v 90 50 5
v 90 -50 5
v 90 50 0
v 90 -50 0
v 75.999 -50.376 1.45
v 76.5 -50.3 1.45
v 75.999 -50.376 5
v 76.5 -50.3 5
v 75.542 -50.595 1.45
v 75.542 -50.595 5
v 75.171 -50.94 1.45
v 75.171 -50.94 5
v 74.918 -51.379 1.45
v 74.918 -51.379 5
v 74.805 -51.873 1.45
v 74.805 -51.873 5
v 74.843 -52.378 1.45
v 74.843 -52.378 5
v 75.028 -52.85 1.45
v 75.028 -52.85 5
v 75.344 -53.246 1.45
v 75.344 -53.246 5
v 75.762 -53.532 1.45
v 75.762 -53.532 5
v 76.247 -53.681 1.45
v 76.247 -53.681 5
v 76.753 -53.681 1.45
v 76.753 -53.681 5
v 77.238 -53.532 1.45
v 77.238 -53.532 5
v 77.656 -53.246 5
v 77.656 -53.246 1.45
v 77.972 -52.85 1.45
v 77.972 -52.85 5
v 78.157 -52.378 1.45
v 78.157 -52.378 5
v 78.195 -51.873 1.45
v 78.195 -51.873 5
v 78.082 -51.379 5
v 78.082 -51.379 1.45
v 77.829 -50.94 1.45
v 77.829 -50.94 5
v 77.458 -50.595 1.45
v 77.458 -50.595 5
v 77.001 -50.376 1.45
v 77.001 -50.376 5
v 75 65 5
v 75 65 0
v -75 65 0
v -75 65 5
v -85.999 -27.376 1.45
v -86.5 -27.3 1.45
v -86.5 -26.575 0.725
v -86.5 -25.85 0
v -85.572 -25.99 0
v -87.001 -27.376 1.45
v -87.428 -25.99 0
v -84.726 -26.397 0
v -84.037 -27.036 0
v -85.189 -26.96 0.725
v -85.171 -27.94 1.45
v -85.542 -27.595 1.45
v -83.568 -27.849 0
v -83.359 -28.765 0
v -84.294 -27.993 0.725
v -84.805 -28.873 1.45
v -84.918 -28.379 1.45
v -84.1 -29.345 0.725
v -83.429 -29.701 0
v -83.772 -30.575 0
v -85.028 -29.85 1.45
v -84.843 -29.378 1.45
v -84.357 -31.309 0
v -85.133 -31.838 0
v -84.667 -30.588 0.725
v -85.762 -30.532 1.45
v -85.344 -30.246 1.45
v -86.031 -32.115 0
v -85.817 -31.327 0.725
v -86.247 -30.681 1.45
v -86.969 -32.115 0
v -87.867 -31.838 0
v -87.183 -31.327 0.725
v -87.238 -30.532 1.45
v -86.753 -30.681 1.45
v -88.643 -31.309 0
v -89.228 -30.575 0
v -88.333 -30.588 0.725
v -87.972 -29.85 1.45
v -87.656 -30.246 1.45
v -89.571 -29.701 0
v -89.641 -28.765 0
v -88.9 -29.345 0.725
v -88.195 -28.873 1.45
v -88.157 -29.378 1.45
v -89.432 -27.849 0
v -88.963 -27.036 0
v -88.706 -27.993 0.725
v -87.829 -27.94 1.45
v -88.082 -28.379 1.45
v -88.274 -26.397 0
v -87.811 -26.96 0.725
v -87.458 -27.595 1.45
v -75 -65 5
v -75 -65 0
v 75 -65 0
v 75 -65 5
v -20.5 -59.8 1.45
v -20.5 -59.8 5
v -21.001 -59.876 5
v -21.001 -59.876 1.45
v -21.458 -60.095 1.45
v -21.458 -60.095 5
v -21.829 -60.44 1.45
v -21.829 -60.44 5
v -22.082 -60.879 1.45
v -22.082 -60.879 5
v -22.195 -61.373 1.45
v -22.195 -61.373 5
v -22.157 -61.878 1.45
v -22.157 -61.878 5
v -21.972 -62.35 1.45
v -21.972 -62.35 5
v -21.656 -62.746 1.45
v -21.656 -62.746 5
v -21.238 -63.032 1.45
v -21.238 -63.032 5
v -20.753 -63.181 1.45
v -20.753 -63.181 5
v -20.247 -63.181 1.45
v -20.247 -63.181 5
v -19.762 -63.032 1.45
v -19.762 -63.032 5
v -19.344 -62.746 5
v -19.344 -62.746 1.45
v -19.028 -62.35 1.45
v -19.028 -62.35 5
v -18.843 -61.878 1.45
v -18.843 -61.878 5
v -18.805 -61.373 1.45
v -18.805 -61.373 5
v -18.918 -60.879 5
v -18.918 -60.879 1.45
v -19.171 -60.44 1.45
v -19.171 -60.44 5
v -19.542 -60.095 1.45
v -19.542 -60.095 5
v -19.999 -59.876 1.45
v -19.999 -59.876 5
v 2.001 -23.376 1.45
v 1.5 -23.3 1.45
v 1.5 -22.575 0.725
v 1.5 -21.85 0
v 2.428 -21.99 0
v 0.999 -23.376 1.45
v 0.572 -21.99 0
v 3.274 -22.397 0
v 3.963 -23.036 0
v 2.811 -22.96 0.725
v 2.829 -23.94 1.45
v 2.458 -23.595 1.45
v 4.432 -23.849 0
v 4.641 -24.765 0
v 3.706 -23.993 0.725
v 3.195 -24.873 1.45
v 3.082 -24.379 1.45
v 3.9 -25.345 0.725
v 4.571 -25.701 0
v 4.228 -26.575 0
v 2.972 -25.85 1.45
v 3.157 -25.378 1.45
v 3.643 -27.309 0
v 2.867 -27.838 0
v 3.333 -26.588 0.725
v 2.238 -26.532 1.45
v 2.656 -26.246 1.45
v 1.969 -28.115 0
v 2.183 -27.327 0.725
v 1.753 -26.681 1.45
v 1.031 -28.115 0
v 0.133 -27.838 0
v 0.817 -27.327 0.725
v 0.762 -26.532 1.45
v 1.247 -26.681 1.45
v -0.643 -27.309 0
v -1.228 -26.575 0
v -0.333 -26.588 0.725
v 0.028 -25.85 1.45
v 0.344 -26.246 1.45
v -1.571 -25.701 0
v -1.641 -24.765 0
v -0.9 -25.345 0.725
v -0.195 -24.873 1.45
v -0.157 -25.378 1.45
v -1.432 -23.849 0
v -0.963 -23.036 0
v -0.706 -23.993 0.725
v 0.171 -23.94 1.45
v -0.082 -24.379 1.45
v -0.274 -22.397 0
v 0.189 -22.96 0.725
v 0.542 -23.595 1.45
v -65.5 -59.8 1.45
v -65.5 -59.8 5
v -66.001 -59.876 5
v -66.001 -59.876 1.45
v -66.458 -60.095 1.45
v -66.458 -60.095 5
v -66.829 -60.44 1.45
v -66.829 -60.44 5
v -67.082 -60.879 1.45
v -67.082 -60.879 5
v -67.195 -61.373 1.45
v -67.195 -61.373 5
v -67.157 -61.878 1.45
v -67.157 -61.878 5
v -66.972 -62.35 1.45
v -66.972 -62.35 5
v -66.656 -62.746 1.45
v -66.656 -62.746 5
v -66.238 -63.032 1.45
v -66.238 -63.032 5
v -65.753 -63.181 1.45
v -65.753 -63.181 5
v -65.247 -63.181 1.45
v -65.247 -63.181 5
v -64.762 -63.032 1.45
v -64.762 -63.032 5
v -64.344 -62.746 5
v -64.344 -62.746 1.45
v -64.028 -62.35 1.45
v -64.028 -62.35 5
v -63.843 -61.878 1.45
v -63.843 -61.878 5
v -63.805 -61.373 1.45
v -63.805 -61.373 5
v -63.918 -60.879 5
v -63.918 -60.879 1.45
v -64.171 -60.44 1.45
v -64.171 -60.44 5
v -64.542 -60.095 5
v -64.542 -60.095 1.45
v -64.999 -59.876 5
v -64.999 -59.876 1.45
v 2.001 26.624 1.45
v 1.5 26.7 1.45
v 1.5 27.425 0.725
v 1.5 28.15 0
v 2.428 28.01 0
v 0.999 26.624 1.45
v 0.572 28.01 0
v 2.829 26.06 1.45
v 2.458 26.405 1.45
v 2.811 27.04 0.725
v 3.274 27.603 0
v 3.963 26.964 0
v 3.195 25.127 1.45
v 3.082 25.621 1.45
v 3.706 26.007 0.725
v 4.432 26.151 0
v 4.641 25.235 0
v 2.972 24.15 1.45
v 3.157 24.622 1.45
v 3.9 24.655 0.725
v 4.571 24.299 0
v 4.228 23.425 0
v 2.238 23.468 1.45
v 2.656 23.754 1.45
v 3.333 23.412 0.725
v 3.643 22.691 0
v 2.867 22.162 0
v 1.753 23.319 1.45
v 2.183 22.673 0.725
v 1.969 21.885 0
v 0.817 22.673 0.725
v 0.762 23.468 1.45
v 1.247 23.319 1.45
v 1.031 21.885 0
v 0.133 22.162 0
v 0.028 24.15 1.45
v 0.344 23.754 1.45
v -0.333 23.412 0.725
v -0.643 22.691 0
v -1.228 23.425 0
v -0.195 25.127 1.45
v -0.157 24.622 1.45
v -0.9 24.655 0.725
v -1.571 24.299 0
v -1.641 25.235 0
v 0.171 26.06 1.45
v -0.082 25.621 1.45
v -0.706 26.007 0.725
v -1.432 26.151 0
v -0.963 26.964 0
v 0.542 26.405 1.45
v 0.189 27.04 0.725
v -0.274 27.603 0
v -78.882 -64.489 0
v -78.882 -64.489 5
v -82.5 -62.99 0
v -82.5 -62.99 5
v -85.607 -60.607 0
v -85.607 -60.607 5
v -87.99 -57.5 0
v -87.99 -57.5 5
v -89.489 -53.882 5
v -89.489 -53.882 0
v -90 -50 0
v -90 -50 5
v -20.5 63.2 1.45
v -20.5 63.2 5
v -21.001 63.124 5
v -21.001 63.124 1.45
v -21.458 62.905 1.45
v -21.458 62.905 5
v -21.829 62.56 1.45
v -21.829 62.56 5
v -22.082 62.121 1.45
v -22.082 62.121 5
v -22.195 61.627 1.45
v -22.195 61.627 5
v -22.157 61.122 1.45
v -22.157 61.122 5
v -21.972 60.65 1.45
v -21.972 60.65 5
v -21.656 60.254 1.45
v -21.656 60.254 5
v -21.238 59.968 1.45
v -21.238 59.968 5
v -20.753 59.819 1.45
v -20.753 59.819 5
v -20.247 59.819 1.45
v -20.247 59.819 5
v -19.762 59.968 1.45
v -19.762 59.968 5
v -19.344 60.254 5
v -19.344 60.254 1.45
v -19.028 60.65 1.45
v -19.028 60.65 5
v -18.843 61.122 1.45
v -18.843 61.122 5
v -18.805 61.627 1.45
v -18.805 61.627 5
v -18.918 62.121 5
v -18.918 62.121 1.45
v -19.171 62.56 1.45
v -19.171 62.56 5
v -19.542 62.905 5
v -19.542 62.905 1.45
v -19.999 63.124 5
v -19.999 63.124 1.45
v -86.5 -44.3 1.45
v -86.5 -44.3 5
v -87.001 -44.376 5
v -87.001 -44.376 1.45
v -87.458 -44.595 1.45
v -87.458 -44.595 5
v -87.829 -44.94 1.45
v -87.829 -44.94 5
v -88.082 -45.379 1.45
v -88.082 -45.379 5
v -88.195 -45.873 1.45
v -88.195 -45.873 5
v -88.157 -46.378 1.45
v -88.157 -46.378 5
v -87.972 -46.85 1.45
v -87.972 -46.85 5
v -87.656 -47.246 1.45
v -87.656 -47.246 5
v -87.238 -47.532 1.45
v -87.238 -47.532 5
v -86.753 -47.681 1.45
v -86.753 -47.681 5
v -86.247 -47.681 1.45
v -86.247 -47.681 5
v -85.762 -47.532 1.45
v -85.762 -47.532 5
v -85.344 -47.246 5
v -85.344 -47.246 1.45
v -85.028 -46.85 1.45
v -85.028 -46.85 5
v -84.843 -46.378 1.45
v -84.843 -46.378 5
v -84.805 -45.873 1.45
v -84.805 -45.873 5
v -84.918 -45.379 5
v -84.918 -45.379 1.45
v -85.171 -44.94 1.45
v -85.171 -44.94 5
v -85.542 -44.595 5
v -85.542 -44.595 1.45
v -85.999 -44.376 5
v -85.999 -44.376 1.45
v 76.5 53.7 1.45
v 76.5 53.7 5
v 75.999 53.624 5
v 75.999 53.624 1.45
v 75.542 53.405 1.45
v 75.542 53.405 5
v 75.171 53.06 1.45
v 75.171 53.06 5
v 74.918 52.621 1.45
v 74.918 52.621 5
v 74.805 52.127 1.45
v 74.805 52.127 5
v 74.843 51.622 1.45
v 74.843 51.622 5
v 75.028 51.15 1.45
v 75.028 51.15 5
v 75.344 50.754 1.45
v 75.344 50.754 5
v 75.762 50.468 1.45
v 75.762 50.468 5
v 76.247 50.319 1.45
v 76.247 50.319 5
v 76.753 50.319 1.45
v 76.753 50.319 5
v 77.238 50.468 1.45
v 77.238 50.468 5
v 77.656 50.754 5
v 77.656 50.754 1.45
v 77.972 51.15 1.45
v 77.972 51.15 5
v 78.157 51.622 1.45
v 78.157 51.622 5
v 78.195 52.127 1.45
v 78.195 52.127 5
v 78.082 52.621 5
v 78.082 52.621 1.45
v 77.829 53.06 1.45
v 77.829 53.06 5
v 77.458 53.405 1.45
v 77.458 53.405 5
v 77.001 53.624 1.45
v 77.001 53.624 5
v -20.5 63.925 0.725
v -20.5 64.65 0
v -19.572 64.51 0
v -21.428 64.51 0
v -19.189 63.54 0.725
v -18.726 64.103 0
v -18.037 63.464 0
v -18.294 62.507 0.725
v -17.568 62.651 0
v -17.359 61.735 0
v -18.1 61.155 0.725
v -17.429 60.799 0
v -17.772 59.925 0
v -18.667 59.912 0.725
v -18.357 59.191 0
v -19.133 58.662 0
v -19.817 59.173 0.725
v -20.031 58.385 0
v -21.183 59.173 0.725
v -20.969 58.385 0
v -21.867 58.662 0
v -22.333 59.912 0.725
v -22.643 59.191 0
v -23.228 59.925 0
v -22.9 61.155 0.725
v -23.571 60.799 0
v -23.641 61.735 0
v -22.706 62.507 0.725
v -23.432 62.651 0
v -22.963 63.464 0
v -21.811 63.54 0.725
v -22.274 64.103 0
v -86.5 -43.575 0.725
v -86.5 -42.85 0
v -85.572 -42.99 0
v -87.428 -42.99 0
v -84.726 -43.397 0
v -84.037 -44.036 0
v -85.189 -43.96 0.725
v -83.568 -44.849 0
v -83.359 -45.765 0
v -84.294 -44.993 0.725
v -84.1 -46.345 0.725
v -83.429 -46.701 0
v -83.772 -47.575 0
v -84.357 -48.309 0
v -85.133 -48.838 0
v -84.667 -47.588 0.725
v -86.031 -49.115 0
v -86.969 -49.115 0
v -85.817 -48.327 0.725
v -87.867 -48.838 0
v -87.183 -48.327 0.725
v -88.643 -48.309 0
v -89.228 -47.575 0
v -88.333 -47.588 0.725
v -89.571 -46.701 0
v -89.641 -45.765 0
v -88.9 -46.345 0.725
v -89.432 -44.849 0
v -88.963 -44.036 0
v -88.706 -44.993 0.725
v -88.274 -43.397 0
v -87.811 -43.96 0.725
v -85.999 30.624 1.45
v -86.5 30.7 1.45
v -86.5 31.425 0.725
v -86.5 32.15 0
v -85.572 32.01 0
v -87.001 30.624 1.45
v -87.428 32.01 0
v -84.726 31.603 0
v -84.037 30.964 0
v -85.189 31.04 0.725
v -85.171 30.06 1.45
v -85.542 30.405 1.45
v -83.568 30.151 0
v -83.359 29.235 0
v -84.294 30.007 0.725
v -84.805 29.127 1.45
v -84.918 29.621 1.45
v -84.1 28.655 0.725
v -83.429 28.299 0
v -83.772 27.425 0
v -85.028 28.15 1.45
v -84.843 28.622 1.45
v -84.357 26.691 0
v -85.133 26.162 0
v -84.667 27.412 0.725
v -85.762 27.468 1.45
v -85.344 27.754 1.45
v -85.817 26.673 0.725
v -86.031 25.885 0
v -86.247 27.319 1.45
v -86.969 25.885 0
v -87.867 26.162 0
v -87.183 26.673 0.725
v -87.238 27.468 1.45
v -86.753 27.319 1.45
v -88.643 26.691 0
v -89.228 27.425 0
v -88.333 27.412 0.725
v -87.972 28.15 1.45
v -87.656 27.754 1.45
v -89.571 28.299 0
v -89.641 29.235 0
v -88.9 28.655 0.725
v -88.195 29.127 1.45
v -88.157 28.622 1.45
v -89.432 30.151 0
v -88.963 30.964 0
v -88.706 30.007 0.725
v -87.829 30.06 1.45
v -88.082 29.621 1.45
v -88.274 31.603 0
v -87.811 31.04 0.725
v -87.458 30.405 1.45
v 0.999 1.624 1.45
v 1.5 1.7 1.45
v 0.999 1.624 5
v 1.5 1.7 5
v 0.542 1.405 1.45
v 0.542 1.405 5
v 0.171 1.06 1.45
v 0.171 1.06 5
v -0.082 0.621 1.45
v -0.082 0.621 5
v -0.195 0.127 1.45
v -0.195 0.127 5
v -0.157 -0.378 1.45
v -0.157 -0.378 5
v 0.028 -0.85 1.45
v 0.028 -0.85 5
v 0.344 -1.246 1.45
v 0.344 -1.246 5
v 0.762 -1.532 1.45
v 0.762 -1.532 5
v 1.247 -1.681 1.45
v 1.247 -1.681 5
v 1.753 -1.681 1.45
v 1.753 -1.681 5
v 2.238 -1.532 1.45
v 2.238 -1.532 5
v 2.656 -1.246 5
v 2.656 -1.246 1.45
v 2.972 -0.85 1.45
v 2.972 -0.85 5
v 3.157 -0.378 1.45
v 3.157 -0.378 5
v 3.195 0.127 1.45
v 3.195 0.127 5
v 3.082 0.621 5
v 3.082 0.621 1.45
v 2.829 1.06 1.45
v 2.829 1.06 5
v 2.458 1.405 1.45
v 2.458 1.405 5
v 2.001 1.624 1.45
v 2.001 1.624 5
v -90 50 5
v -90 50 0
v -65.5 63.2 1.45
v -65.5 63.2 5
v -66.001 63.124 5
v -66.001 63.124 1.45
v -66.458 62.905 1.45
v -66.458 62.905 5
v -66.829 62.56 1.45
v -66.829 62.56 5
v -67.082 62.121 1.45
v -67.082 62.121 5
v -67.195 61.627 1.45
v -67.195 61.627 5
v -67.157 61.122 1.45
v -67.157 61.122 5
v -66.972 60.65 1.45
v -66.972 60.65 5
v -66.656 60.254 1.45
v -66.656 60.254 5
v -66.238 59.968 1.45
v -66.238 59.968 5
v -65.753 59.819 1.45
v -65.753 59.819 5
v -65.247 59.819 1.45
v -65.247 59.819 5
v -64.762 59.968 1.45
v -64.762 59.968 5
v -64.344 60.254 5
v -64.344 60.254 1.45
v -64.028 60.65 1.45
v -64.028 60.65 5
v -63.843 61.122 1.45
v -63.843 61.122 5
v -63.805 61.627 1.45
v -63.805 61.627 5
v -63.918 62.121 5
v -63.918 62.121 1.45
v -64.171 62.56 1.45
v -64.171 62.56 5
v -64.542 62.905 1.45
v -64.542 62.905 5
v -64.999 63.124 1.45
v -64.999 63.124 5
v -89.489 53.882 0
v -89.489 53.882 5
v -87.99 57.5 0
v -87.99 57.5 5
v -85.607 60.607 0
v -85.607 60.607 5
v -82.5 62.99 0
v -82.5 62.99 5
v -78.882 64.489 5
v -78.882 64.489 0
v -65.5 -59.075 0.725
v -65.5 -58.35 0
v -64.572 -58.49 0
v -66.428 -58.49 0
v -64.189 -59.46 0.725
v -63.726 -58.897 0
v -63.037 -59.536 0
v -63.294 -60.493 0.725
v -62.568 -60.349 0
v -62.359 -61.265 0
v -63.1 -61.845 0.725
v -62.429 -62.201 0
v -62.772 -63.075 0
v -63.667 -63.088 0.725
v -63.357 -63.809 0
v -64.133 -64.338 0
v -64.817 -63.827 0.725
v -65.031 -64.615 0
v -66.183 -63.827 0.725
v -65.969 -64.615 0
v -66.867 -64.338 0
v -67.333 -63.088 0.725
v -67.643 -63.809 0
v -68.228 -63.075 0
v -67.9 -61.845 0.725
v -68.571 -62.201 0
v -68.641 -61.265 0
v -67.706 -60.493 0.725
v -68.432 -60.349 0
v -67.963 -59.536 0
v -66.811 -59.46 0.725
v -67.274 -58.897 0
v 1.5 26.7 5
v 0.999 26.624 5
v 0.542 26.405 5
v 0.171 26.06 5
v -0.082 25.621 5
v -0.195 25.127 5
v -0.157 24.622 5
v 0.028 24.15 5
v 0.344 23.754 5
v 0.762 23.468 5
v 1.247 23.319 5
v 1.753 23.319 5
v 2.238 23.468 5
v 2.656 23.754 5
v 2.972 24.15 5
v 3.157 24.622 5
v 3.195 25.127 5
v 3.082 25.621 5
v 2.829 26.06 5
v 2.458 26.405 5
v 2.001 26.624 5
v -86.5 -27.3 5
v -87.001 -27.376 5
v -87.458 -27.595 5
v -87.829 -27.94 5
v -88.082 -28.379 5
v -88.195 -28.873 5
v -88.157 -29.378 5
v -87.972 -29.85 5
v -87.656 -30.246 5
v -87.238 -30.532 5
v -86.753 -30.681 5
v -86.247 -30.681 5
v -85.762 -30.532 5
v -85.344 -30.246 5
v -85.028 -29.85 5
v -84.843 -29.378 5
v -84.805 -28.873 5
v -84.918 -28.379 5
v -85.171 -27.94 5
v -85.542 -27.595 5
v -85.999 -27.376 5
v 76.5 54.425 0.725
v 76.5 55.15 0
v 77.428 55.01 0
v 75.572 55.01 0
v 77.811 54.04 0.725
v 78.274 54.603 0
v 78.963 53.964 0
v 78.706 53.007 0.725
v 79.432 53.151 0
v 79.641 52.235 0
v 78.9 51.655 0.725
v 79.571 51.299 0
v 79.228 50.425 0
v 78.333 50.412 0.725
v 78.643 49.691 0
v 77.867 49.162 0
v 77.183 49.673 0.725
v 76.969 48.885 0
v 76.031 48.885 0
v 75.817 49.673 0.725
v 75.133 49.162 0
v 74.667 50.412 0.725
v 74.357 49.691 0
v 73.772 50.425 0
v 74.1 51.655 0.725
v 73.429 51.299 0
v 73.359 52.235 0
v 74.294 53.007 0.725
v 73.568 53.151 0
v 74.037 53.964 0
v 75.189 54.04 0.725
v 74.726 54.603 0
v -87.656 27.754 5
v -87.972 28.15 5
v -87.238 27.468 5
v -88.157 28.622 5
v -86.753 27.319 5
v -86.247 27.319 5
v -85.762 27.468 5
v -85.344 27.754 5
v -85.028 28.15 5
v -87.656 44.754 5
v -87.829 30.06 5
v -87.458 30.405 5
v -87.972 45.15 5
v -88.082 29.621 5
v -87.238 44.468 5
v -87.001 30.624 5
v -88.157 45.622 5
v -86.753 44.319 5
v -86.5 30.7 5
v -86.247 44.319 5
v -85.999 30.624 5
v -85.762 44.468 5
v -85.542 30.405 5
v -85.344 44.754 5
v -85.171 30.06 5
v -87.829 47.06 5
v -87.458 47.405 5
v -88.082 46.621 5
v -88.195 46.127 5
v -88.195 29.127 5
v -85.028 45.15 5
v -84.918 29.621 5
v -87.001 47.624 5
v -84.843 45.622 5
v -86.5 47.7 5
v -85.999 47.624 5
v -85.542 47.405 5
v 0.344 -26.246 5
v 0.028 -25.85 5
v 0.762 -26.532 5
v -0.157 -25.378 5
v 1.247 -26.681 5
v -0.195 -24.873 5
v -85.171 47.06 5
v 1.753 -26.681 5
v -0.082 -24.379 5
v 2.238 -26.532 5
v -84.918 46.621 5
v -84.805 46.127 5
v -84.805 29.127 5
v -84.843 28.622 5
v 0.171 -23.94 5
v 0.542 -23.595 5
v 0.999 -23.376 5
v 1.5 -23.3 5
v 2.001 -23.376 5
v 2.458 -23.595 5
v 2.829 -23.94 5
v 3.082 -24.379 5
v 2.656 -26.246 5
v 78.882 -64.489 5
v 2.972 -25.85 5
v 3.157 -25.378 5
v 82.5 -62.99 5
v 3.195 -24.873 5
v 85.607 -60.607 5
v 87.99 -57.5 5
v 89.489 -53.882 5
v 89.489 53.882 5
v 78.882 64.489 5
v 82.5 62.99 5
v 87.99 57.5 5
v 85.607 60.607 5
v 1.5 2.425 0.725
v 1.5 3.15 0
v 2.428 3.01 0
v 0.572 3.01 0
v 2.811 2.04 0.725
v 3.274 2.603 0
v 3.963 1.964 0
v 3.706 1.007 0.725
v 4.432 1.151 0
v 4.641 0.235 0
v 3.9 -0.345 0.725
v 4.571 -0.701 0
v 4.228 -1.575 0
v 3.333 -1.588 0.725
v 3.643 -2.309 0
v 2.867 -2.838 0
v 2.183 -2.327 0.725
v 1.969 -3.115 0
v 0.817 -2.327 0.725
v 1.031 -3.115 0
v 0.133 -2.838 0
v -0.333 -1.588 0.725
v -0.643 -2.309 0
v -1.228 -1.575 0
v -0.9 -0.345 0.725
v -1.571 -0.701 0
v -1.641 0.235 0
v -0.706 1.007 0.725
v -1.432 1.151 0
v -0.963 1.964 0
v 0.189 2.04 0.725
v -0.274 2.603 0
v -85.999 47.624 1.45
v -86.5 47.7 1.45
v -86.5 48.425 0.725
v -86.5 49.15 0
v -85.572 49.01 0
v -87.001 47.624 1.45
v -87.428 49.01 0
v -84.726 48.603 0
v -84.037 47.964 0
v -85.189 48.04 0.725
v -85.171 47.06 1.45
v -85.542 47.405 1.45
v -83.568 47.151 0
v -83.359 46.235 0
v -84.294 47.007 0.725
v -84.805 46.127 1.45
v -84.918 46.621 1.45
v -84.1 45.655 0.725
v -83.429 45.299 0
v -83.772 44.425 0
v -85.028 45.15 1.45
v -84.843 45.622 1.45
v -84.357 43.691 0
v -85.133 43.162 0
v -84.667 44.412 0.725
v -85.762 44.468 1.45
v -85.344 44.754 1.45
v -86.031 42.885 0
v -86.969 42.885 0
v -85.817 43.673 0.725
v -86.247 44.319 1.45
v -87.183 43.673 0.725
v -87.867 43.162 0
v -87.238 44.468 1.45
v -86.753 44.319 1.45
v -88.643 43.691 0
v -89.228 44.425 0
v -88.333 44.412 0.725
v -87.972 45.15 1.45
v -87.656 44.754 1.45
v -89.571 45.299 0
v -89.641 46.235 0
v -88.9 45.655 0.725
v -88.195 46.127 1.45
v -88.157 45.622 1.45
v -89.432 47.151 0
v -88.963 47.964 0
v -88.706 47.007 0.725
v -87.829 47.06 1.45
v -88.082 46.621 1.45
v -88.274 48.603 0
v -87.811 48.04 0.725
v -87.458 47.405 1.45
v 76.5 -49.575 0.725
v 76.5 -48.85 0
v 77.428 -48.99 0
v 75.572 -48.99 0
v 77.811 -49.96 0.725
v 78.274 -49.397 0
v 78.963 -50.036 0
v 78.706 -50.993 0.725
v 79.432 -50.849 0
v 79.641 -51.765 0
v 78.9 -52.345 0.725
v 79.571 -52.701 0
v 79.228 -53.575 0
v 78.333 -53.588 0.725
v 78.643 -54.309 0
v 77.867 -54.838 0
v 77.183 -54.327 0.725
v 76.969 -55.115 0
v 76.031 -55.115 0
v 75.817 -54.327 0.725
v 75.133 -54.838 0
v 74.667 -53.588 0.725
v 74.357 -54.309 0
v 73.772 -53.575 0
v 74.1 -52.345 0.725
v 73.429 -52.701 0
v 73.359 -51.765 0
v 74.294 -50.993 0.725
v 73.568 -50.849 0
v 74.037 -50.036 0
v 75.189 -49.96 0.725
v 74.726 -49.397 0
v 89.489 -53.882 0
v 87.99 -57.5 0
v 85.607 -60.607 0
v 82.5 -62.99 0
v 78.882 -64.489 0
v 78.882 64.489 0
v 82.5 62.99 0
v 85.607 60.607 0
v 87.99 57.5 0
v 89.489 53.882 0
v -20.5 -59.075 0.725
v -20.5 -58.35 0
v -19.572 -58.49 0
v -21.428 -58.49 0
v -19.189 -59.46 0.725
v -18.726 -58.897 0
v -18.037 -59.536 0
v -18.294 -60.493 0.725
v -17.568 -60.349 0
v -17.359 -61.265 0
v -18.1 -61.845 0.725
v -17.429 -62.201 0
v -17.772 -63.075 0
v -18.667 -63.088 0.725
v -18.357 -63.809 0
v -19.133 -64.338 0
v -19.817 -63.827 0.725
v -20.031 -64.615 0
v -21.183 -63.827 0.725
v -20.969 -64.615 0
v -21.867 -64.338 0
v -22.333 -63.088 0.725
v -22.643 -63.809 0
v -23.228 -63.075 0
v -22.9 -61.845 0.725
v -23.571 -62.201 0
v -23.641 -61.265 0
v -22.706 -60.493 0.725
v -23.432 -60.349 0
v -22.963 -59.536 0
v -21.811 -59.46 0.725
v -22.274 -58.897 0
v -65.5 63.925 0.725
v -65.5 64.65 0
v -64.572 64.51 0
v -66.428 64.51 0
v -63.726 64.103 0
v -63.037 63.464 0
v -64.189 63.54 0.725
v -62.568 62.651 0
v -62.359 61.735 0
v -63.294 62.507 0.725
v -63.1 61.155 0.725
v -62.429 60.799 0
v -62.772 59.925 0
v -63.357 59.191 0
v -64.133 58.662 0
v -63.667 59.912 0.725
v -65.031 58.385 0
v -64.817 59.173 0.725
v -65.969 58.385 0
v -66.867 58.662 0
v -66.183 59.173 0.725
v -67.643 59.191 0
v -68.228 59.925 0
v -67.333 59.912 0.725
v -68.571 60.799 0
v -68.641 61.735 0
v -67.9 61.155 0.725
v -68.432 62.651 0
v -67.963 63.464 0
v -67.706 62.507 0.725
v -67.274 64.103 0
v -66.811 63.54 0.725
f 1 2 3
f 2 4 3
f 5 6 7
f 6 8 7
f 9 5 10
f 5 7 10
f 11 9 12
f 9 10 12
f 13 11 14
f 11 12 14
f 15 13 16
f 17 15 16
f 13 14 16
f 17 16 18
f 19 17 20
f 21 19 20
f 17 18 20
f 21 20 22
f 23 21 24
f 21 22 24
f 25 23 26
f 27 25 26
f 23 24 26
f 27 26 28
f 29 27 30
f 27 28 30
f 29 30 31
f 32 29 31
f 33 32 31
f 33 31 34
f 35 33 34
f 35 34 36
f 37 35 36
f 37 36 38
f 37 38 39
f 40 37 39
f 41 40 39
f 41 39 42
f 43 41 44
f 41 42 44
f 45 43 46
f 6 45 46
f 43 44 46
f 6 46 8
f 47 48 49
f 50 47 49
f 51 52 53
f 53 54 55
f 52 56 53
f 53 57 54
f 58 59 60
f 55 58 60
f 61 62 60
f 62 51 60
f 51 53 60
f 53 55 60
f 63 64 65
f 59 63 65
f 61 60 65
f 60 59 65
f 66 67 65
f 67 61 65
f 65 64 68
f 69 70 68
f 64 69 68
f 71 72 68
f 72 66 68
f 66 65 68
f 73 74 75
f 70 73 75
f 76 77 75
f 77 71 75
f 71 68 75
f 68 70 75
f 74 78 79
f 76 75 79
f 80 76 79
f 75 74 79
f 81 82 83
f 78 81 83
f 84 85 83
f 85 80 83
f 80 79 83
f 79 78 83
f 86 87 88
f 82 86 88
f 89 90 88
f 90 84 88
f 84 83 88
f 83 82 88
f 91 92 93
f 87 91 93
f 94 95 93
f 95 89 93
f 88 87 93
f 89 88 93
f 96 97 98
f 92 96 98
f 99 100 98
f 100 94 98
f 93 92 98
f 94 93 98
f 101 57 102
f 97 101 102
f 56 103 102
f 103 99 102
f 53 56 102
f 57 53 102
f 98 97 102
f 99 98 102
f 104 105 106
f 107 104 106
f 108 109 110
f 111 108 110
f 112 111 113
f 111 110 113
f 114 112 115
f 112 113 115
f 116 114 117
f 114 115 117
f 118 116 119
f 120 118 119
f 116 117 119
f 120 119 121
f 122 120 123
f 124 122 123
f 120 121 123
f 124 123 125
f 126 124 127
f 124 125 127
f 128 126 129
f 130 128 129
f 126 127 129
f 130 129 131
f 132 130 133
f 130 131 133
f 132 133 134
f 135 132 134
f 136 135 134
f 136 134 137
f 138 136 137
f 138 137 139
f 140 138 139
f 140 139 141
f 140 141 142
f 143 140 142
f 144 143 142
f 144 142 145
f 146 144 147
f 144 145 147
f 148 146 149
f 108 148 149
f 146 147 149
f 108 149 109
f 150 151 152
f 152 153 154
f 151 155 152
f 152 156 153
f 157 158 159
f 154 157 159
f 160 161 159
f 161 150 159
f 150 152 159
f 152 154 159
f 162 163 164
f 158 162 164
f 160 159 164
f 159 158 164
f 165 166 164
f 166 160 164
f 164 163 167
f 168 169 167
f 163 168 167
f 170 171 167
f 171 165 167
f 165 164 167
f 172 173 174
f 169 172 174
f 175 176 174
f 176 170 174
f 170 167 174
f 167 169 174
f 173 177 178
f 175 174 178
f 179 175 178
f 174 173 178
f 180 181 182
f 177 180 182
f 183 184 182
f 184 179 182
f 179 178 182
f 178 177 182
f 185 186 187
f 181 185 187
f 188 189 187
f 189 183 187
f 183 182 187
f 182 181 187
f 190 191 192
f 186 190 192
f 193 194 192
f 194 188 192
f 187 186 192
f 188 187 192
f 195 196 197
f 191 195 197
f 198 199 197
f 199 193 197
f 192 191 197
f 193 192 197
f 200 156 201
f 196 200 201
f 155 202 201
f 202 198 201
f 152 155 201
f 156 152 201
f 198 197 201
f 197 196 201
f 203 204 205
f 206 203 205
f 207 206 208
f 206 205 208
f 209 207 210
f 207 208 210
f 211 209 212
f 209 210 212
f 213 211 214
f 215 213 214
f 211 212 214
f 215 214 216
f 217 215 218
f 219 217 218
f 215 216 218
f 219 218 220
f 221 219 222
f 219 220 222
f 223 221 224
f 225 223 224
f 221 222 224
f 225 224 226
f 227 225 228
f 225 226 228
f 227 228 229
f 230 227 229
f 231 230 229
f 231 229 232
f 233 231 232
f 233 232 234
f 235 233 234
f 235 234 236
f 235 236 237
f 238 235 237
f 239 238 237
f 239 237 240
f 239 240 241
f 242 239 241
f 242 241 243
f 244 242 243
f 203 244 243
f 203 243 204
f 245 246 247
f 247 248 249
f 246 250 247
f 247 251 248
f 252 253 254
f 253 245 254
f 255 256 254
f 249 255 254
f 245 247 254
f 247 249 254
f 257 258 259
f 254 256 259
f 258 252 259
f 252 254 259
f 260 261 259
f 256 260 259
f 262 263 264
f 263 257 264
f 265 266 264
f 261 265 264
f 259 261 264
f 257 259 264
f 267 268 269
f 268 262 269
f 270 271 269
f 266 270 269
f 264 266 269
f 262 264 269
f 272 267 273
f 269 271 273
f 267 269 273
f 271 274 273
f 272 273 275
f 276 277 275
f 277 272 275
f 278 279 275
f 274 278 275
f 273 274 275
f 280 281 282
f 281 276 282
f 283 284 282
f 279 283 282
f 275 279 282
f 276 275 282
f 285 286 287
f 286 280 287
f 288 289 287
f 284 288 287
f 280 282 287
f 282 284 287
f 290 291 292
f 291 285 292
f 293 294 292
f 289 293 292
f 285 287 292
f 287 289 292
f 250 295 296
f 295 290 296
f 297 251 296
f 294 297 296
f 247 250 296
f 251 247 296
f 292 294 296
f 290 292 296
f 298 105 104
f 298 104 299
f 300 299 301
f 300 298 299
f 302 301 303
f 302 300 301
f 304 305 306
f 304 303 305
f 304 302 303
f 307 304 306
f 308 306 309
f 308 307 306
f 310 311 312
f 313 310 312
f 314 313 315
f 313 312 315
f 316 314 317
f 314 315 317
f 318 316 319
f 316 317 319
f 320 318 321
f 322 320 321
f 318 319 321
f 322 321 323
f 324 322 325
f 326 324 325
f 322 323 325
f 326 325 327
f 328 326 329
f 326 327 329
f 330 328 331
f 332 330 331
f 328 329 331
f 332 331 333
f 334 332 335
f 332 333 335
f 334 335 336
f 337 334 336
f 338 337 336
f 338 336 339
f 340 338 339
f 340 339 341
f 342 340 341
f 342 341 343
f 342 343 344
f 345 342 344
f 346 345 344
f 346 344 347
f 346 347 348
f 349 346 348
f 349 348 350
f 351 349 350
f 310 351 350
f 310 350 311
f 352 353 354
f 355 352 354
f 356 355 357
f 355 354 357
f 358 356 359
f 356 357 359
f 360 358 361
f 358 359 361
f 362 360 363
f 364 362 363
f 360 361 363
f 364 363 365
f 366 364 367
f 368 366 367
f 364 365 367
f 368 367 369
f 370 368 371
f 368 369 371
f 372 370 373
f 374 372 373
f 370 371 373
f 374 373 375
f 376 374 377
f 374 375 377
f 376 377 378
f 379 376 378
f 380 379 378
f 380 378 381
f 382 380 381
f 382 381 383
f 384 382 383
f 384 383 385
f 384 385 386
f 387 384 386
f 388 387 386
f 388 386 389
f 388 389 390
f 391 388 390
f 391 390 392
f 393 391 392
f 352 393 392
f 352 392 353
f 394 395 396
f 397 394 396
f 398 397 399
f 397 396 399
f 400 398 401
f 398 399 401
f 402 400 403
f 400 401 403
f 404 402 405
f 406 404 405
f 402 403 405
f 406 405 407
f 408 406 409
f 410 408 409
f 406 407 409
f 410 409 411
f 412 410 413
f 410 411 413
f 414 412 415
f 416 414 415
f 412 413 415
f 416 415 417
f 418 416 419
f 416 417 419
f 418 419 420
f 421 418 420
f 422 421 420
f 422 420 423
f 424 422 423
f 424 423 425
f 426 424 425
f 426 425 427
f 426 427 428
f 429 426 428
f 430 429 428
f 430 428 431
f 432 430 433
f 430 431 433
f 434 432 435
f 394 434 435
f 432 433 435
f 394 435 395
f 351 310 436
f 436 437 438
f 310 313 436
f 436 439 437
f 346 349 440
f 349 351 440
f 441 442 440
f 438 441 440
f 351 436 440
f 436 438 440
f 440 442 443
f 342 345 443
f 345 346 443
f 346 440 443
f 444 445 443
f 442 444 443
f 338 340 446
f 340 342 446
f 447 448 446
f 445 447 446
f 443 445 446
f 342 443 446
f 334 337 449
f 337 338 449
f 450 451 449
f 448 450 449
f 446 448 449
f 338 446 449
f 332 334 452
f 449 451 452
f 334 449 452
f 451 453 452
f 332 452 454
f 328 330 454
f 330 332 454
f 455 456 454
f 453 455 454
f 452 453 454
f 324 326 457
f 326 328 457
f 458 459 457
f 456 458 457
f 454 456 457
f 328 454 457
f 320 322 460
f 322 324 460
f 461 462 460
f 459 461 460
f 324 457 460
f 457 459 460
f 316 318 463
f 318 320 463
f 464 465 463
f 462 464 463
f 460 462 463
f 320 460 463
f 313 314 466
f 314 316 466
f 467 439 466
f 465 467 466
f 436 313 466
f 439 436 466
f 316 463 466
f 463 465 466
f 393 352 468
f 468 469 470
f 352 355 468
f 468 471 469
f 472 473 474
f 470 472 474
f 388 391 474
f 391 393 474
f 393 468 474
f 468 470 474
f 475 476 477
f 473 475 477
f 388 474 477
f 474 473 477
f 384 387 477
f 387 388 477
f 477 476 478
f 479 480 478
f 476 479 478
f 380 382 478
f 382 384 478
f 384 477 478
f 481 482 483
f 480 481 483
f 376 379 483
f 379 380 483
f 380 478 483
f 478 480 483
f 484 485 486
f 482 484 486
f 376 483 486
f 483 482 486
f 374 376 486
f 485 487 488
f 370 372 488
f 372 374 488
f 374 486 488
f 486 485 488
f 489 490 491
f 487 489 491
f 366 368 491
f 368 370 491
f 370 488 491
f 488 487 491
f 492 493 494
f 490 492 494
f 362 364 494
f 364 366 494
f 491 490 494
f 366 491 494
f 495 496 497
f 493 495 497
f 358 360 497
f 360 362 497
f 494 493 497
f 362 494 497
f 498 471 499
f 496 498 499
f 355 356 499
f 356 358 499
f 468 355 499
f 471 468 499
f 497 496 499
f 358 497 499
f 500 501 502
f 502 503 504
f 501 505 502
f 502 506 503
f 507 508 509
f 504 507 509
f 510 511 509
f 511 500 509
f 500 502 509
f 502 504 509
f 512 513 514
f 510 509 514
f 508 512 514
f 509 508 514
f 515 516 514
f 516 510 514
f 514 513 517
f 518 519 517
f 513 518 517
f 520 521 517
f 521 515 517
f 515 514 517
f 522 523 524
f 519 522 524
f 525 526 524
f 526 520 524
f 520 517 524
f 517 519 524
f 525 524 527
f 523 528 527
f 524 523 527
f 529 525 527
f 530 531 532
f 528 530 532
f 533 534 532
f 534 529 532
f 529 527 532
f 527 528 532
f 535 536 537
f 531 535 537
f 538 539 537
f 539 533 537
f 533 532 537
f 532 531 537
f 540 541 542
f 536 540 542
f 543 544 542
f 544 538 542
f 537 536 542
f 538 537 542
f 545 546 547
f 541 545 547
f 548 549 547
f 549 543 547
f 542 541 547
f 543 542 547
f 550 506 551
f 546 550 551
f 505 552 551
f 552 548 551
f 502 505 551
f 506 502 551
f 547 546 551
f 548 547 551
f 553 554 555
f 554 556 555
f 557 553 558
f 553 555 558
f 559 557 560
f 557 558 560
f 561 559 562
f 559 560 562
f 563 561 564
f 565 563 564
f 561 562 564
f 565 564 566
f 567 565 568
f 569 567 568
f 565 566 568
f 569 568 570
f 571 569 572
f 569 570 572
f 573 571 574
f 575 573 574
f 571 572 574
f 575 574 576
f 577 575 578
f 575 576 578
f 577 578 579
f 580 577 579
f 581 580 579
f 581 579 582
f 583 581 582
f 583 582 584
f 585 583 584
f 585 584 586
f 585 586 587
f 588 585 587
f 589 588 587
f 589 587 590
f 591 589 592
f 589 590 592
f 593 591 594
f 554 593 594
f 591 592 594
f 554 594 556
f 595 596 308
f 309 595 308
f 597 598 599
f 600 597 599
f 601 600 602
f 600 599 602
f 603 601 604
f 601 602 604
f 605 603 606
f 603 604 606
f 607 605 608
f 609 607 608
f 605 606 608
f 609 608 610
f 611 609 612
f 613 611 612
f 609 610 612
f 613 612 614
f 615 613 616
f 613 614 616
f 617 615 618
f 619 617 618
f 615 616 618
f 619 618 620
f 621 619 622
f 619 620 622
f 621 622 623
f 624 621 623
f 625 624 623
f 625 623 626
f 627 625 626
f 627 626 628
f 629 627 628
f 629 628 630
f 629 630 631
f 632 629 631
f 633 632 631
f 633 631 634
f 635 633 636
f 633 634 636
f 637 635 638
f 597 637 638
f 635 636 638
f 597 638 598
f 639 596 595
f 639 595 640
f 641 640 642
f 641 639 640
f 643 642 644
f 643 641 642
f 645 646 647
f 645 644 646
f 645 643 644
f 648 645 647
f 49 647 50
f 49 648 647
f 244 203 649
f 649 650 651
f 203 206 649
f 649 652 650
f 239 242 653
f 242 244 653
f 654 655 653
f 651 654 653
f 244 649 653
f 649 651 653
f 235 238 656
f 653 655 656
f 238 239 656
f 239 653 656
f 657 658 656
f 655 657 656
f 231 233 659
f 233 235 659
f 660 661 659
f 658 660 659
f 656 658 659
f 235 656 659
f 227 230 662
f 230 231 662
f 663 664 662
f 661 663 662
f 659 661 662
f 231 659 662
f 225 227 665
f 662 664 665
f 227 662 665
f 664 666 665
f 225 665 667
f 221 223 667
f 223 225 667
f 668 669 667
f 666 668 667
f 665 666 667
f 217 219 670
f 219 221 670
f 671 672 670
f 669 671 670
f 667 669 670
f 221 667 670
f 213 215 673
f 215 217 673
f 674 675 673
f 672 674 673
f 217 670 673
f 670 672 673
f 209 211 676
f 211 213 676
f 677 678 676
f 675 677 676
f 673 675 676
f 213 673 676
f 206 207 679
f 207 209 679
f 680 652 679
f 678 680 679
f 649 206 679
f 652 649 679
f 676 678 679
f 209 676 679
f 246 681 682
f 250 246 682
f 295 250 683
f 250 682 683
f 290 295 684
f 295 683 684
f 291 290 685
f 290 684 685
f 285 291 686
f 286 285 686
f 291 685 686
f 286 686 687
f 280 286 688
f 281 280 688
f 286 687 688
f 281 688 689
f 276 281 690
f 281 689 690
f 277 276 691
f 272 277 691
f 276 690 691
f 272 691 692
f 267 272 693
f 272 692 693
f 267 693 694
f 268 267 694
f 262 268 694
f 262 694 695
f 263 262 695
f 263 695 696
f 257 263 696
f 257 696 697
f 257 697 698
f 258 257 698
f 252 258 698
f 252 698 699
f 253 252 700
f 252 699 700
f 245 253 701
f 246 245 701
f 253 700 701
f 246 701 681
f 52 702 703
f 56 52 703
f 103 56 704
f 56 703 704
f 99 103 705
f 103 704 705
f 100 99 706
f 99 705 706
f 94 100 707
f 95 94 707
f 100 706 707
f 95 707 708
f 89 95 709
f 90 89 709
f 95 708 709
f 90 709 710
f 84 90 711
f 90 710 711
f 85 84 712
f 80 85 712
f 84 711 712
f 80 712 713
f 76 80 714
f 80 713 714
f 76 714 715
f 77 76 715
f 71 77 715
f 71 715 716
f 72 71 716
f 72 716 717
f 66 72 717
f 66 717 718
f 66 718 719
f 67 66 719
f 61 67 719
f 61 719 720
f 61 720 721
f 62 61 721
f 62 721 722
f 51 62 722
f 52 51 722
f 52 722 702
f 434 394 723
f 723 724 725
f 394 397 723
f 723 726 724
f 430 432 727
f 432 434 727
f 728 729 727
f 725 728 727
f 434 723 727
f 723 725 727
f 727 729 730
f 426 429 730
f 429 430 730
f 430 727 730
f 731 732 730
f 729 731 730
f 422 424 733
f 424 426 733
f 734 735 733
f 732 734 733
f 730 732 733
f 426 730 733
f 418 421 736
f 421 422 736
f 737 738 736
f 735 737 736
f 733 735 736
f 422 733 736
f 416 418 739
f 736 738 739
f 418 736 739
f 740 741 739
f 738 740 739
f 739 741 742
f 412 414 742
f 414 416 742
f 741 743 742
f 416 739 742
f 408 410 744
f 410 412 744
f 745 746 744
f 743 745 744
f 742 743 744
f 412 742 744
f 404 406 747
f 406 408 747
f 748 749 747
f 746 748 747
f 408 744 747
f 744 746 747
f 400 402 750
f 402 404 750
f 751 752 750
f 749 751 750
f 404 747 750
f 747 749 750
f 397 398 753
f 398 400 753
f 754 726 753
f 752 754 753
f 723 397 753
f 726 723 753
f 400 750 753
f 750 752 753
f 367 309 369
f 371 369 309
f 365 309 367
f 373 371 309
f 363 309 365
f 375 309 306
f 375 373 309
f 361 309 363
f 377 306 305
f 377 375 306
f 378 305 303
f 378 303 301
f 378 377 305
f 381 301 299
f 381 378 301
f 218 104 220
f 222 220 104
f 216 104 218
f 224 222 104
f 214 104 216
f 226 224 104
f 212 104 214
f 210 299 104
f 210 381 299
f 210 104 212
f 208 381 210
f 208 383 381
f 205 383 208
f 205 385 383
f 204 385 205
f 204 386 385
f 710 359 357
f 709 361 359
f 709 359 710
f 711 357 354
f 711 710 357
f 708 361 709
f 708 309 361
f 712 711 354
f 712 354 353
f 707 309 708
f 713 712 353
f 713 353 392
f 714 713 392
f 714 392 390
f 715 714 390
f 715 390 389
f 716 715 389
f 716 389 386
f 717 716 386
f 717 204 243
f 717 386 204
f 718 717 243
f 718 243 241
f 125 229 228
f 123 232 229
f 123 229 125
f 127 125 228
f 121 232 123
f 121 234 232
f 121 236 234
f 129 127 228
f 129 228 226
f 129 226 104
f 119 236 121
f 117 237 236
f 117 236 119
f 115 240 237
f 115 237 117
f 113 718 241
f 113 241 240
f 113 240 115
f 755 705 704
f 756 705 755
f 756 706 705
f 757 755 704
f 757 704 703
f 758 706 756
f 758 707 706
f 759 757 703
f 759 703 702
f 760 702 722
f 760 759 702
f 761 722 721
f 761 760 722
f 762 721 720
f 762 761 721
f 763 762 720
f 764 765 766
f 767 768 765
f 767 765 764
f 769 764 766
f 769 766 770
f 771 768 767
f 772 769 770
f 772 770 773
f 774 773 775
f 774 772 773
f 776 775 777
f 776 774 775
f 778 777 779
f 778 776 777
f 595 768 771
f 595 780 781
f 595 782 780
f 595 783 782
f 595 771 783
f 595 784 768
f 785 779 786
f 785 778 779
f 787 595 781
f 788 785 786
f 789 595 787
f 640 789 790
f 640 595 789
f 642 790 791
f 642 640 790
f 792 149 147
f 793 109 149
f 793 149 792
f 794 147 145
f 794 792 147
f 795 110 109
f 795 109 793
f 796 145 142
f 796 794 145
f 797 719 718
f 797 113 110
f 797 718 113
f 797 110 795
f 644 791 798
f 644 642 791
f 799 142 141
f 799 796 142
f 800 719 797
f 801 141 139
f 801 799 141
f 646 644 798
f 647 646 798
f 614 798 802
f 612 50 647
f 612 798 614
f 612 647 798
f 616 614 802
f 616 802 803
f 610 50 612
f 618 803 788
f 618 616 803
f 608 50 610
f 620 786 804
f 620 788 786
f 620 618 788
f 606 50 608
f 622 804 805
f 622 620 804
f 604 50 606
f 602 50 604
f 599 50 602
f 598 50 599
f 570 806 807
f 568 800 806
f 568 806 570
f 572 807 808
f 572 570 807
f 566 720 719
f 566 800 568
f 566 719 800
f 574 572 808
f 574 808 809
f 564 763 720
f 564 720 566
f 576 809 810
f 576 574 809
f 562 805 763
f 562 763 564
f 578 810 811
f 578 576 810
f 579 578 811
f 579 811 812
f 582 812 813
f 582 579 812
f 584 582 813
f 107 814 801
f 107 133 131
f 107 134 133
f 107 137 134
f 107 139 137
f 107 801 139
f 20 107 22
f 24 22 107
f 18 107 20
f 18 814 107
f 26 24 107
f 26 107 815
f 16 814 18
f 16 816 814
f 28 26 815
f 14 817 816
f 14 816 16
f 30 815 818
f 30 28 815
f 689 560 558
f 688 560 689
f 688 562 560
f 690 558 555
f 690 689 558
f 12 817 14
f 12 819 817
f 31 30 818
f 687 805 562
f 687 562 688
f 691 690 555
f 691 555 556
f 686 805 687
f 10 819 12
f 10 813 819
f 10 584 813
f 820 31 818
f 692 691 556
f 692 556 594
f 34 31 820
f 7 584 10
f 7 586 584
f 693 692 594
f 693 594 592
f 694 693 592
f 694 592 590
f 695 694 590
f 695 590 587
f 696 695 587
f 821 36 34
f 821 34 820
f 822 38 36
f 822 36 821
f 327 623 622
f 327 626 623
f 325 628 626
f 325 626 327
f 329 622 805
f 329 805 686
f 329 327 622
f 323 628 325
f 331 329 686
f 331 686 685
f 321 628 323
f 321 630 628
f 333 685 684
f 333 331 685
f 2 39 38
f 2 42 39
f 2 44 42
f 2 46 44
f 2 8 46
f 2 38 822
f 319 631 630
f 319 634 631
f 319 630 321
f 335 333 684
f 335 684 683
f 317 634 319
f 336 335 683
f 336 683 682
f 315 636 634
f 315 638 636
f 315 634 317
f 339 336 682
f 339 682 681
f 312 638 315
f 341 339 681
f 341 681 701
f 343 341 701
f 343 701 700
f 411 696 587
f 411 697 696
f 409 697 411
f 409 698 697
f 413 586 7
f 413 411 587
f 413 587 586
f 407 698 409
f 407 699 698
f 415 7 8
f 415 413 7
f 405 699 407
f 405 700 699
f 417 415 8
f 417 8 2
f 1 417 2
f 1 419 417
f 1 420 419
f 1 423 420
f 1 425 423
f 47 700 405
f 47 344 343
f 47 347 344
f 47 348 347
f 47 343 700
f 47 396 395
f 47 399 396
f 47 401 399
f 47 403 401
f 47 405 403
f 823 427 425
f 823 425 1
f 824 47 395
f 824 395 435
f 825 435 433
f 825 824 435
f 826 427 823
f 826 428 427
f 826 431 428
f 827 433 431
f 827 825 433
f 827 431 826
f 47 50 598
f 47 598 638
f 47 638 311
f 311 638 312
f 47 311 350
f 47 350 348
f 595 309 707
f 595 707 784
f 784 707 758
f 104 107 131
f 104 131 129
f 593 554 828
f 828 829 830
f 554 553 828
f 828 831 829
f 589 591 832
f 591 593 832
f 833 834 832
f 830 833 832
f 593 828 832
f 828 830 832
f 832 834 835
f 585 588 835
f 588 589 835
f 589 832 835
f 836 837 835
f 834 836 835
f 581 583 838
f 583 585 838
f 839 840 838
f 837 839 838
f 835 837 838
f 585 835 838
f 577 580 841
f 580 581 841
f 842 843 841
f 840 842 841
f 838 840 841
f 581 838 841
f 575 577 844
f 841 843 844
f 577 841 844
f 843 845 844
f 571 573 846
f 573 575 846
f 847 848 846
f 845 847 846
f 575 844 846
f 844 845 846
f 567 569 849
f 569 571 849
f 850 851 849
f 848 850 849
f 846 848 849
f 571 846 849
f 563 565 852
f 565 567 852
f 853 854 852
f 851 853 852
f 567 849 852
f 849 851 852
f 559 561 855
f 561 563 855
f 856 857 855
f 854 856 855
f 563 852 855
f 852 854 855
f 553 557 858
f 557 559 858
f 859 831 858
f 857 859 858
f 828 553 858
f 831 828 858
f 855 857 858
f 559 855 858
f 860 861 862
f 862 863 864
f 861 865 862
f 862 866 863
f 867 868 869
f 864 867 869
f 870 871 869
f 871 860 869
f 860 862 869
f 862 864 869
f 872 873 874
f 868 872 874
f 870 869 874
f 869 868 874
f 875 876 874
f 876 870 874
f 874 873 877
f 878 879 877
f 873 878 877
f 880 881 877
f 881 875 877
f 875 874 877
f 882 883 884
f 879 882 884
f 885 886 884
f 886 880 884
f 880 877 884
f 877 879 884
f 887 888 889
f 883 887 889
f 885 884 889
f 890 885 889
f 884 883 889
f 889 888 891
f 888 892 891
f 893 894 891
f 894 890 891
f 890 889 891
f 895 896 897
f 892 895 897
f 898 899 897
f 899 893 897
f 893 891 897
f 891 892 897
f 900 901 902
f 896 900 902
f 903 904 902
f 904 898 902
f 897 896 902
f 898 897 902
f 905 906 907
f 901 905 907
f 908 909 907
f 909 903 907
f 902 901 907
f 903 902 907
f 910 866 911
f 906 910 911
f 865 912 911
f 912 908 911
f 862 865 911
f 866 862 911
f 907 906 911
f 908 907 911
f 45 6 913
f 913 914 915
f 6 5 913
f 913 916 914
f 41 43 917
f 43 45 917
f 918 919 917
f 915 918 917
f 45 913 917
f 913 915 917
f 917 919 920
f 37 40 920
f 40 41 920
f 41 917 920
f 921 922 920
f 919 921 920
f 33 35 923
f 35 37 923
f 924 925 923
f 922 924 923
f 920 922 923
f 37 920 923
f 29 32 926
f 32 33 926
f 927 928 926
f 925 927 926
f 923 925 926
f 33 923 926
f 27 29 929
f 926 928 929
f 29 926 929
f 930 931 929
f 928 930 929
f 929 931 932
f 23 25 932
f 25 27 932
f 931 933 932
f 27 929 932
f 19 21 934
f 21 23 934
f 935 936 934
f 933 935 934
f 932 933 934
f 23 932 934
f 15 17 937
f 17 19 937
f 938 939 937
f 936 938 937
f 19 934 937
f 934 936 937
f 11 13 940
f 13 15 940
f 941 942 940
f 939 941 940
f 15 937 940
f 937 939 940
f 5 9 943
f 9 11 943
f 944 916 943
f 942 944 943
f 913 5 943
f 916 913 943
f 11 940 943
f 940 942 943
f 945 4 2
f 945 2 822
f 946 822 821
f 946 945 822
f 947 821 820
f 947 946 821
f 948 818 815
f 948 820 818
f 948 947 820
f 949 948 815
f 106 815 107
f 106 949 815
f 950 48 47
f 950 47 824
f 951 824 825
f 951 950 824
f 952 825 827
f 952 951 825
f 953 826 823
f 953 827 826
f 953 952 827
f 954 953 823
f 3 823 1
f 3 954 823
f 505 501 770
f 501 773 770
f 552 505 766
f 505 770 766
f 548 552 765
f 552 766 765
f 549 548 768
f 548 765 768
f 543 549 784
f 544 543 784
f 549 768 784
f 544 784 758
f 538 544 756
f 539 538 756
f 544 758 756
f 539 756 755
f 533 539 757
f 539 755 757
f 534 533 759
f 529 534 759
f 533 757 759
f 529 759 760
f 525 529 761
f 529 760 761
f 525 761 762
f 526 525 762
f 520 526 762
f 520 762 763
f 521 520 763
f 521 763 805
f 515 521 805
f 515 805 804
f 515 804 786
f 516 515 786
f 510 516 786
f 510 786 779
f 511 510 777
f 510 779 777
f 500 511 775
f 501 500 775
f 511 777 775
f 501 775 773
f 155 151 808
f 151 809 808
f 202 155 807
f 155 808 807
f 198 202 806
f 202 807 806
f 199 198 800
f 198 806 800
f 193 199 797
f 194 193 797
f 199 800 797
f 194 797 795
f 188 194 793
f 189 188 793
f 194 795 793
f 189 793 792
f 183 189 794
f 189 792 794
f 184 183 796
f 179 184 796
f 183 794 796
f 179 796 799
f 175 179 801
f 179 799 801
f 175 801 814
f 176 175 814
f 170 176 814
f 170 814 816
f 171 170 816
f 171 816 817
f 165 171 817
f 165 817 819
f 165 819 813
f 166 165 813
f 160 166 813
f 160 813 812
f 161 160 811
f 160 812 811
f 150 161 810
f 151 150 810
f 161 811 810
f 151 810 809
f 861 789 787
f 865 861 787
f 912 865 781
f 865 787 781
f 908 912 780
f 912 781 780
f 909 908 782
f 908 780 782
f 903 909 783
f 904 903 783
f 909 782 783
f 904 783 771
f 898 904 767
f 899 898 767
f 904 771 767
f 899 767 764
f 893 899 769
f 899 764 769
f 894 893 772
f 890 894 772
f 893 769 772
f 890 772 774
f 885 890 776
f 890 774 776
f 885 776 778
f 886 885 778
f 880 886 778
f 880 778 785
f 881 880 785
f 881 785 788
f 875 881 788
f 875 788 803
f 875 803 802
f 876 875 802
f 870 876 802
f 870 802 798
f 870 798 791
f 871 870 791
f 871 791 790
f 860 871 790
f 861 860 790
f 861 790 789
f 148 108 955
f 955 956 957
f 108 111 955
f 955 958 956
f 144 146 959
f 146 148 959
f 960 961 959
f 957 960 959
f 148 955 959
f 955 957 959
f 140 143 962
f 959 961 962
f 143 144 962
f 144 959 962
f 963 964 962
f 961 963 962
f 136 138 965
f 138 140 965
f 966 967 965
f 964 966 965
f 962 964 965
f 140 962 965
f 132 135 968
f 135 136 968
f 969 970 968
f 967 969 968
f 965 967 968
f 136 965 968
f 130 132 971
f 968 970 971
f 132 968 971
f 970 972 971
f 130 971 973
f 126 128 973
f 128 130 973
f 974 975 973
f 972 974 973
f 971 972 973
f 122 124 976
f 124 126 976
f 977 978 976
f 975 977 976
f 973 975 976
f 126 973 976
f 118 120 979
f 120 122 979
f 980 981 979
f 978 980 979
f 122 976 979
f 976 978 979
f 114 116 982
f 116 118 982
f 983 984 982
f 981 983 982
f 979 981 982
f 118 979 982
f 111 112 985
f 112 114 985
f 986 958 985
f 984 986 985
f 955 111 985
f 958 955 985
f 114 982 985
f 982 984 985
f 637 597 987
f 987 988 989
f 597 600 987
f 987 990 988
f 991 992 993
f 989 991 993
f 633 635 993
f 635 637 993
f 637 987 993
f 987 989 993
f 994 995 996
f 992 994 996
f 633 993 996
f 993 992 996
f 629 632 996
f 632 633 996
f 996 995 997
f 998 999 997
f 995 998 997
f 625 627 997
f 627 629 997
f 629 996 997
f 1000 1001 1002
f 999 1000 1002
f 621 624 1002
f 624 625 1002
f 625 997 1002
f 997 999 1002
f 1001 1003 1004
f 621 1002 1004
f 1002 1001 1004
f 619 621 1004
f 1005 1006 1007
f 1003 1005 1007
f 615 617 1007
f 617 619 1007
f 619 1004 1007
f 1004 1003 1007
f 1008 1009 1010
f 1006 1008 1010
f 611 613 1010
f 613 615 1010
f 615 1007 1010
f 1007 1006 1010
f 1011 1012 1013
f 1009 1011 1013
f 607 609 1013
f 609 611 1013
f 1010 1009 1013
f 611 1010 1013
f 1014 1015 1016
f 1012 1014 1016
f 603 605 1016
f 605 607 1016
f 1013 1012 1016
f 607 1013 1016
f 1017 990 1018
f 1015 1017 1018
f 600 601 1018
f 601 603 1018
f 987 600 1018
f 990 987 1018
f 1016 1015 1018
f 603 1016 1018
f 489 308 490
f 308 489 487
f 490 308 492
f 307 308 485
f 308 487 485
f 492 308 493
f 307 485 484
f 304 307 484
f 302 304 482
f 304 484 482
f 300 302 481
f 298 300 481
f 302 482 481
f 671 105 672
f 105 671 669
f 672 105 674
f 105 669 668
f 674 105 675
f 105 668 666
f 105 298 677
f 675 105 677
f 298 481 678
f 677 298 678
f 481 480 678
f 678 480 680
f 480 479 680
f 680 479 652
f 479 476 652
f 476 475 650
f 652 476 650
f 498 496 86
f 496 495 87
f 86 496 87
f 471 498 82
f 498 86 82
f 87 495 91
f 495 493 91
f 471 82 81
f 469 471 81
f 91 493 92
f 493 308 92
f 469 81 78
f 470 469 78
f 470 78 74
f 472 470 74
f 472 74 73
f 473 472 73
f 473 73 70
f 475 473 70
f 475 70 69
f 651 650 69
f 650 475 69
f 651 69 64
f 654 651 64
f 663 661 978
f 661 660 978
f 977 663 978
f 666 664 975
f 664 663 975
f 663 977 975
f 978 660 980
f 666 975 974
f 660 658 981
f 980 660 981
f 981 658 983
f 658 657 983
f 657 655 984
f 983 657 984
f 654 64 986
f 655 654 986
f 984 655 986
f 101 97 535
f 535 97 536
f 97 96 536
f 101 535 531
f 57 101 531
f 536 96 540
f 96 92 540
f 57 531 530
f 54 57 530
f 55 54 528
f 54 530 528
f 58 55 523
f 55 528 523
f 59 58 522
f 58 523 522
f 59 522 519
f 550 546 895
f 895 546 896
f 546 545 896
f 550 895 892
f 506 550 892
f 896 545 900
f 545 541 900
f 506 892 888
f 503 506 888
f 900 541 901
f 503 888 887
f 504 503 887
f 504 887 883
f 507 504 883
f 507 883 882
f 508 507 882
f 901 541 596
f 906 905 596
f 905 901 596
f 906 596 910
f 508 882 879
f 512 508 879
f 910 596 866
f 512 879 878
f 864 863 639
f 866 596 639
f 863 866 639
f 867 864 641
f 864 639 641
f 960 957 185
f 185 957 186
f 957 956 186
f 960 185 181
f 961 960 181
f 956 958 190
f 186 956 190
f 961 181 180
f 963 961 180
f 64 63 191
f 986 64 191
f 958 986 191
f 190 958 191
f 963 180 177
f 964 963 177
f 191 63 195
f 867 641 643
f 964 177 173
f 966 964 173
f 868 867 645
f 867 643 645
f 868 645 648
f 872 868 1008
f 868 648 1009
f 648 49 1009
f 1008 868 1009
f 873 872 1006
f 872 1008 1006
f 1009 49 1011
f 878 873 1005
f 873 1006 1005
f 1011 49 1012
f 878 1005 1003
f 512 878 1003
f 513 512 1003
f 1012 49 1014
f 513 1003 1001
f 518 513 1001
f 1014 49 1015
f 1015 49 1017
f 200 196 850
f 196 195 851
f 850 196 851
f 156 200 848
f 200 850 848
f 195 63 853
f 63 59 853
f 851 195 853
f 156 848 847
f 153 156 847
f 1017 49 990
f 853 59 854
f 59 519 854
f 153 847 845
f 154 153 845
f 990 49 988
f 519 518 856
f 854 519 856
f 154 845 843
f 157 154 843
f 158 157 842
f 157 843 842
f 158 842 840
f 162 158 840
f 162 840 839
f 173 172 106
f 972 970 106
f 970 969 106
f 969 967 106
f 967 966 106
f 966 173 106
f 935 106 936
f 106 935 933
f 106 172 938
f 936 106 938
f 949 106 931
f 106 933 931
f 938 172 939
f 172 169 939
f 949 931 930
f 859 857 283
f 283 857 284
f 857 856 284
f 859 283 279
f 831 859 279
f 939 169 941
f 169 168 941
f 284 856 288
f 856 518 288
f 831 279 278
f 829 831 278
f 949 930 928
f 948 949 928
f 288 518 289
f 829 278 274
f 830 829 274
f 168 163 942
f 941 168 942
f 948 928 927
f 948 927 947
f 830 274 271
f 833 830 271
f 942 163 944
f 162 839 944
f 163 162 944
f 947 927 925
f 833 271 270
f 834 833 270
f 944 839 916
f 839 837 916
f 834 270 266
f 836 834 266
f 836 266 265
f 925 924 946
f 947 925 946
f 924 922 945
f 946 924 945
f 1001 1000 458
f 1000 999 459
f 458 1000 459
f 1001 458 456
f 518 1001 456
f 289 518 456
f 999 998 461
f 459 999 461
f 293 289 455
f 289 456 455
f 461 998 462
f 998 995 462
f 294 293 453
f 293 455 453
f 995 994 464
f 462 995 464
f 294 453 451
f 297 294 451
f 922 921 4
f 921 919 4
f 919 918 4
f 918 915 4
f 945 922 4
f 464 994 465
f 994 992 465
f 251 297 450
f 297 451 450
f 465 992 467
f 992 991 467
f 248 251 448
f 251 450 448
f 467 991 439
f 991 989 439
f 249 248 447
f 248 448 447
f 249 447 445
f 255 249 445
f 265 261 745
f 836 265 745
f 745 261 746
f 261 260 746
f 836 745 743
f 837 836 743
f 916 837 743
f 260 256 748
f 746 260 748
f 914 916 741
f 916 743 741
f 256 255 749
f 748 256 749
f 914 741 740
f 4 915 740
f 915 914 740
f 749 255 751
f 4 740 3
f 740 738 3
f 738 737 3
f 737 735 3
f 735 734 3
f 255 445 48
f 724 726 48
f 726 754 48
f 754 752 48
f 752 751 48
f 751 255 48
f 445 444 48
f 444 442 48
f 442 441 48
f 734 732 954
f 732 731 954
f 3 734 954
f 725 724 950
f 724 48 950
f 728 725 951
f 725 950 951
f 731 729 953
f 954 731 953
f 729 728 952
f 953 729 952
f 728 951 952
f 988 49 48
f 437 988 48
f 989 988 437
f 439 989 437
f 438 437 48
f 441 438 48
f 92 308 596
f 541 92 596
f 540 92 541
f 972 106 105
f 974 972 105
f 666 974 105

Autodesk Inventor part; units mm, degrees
ref_plane "YZ Plane" through (0, 0, 0) normal (1, 0, 0) x (0, 1, 0)
ref_plane "XZ Plane" through (0, 0, 0) normal (0, 1, 0) x (-1, 0, 0)
ref_plane "XY Plane" through (0, 0, 0) normal (0, 0, 1) x (1, 0, 0)
sketch "Sketch1" plane through (0, 0, 0) normal (0, 0, 1) x (1, 0, 0)
  line L0 (-75, -65) -> (75, -65)
  line L1 (90, -50) -> (90, 50)
  line L2 (75, 65) -> (-75, 65)
  line L3 (-90, 50) -> (-90, -50)
  line L4 (-90, -65) -> (90, 65) construction
  line L5 (90, -65) -> (-90, 65) construction
  arc A0 (-75, 65) -> (-90, 50) centre (-75, 50) ccw
  arc A1 (-90, -50) -> (-75, -65) centre (-75, -50) ccw
  arc A2 (75, -65) -> (90, -50) centre (75, -50) ccw
  arc A3 (90, 50) -> (75, 65) centre (75, 50) ccw
  point P0 (0, 0)
  dimension "d0" = 130
  dimension "d1" = 180
  dimension "d2" = 15
  dimension "d3" = 15
extrude "Extrusion1" add sketch "Sketch1" along normal blind 5
sketch "Sketch2" plane through (0, 0, 0) normal (0, 0, -1) x (-1, 0, 0)
  circle A0 centre (65.5, 61.5) radius 2 projected
  circle A1 centre (86.5, 46) radius 2 projected
  circle A2 centre (20.5, 61.5) radius 2 projected
  circle A3 centre (86.5, 29) radius 2 projected
  line L0 (12.5, 65) -> (12.5, 57) projected
  line L1 (12.5, 57) -> (75, 57) projected
  arc A4 (82, 50) -> (75, 57) centre (75, 50) ccw projected
  line L2 (82, 50) -> (82, 23) projected
  line L3 (82, 23) -> (90, 23) projected
  line L4 (90, 23) -> (90, 50) projected
  arc A5 (90, 50) -> (75, 65) centre (75, 50) ccw projected
  line L5 (75, 65) -> (12.5, 65) projected
  circle A6 centre (-1.5, -25) radius 2 projected
  circle A7 centre (-1.5, 0) radius 2 projected
  circle A8 centre (-1.5, 25) radius 2 projected
  arc A9 (4.5, 33) -> (2.5, 35) centre (2.5, 33) ccw projected
  line L6 (2.5, 35) -> (-5.5, 35) projected
  arc A10 (-5.5, 35) -> (-7.5, 33) centre (-5.5, 33) ccw projected
  line L7 (-7.5, 33) -> (-7.5, -33) projected
  arc A11 (-7.5, -33) -> (-5.5, -35) centre (-5.5, -33) ccw projected
  line L8 (-5.5, -35) -> (2.5, -35) projected
  arc A12 (2.5, -35) -> (4.5, -33) centre (2.5, -33) ccw projected
  line L9 (4.5, -33) -> (4.5, 33) projected
  circle A13 centre (-76.5, 52) radius 2 projected
  circle A14 centre (-76.5, 52) radius 7.5 projected
  circle A15 centre (-76.5, -52) radius 2 projected
  circle A16 centre (20.5, -61.5) radius 2 projected
  circle A17 centre (65.5, -61.5) radius 2 projected
  circle A18 centre (86.5, -29) radius 2 projected
  circle A19 centre (86.5, -46) radius 2 projected
  line L10 (12.5, -57) -> (12.5, -65) projected
  line L11 (12.5, -65) -> (75, -65) projected
  arc A20 (75, -65) -> (90, -50) centre (75, -50) ccw projected
  line L12 (90, -50) -> (90, -23) projected
  line L13 (90, -23) -> (82, -23) projected
  line L14 (82, -23) -> (82, -50) projected
  arc A21 (75, -57) -> (82, -50) centre (75, -50) ccw projected
  line L15 (75, -57) -> (12.5, -57) projected
  point P0 (0, 0)
hole "Hole1" at (-86.5, -29, 0) at (-86.5, -46, 0) at (-65.5, -61.5, 0) at (-20.5, -61.5, 0) at (1.5, -25, 0) at (1.5, 0, 0) at (1.5, 25, 0) at (76.5, -52, 0) at (76.5, 52, 0) at (-20.5, 61.5, 0) at (-65.5, 61.5, 0) at (-86.5, 46, 0) at (-86.5, 29, 0) direction (0, 0, 1) diameter 3.4 end through all countersink diameter 6.3 countersink angle 90 clearance for "Countersunk Flat Head Screw ISO 2009/7046" size "M3" standard "ISO"
properties part number "fleet_top"
